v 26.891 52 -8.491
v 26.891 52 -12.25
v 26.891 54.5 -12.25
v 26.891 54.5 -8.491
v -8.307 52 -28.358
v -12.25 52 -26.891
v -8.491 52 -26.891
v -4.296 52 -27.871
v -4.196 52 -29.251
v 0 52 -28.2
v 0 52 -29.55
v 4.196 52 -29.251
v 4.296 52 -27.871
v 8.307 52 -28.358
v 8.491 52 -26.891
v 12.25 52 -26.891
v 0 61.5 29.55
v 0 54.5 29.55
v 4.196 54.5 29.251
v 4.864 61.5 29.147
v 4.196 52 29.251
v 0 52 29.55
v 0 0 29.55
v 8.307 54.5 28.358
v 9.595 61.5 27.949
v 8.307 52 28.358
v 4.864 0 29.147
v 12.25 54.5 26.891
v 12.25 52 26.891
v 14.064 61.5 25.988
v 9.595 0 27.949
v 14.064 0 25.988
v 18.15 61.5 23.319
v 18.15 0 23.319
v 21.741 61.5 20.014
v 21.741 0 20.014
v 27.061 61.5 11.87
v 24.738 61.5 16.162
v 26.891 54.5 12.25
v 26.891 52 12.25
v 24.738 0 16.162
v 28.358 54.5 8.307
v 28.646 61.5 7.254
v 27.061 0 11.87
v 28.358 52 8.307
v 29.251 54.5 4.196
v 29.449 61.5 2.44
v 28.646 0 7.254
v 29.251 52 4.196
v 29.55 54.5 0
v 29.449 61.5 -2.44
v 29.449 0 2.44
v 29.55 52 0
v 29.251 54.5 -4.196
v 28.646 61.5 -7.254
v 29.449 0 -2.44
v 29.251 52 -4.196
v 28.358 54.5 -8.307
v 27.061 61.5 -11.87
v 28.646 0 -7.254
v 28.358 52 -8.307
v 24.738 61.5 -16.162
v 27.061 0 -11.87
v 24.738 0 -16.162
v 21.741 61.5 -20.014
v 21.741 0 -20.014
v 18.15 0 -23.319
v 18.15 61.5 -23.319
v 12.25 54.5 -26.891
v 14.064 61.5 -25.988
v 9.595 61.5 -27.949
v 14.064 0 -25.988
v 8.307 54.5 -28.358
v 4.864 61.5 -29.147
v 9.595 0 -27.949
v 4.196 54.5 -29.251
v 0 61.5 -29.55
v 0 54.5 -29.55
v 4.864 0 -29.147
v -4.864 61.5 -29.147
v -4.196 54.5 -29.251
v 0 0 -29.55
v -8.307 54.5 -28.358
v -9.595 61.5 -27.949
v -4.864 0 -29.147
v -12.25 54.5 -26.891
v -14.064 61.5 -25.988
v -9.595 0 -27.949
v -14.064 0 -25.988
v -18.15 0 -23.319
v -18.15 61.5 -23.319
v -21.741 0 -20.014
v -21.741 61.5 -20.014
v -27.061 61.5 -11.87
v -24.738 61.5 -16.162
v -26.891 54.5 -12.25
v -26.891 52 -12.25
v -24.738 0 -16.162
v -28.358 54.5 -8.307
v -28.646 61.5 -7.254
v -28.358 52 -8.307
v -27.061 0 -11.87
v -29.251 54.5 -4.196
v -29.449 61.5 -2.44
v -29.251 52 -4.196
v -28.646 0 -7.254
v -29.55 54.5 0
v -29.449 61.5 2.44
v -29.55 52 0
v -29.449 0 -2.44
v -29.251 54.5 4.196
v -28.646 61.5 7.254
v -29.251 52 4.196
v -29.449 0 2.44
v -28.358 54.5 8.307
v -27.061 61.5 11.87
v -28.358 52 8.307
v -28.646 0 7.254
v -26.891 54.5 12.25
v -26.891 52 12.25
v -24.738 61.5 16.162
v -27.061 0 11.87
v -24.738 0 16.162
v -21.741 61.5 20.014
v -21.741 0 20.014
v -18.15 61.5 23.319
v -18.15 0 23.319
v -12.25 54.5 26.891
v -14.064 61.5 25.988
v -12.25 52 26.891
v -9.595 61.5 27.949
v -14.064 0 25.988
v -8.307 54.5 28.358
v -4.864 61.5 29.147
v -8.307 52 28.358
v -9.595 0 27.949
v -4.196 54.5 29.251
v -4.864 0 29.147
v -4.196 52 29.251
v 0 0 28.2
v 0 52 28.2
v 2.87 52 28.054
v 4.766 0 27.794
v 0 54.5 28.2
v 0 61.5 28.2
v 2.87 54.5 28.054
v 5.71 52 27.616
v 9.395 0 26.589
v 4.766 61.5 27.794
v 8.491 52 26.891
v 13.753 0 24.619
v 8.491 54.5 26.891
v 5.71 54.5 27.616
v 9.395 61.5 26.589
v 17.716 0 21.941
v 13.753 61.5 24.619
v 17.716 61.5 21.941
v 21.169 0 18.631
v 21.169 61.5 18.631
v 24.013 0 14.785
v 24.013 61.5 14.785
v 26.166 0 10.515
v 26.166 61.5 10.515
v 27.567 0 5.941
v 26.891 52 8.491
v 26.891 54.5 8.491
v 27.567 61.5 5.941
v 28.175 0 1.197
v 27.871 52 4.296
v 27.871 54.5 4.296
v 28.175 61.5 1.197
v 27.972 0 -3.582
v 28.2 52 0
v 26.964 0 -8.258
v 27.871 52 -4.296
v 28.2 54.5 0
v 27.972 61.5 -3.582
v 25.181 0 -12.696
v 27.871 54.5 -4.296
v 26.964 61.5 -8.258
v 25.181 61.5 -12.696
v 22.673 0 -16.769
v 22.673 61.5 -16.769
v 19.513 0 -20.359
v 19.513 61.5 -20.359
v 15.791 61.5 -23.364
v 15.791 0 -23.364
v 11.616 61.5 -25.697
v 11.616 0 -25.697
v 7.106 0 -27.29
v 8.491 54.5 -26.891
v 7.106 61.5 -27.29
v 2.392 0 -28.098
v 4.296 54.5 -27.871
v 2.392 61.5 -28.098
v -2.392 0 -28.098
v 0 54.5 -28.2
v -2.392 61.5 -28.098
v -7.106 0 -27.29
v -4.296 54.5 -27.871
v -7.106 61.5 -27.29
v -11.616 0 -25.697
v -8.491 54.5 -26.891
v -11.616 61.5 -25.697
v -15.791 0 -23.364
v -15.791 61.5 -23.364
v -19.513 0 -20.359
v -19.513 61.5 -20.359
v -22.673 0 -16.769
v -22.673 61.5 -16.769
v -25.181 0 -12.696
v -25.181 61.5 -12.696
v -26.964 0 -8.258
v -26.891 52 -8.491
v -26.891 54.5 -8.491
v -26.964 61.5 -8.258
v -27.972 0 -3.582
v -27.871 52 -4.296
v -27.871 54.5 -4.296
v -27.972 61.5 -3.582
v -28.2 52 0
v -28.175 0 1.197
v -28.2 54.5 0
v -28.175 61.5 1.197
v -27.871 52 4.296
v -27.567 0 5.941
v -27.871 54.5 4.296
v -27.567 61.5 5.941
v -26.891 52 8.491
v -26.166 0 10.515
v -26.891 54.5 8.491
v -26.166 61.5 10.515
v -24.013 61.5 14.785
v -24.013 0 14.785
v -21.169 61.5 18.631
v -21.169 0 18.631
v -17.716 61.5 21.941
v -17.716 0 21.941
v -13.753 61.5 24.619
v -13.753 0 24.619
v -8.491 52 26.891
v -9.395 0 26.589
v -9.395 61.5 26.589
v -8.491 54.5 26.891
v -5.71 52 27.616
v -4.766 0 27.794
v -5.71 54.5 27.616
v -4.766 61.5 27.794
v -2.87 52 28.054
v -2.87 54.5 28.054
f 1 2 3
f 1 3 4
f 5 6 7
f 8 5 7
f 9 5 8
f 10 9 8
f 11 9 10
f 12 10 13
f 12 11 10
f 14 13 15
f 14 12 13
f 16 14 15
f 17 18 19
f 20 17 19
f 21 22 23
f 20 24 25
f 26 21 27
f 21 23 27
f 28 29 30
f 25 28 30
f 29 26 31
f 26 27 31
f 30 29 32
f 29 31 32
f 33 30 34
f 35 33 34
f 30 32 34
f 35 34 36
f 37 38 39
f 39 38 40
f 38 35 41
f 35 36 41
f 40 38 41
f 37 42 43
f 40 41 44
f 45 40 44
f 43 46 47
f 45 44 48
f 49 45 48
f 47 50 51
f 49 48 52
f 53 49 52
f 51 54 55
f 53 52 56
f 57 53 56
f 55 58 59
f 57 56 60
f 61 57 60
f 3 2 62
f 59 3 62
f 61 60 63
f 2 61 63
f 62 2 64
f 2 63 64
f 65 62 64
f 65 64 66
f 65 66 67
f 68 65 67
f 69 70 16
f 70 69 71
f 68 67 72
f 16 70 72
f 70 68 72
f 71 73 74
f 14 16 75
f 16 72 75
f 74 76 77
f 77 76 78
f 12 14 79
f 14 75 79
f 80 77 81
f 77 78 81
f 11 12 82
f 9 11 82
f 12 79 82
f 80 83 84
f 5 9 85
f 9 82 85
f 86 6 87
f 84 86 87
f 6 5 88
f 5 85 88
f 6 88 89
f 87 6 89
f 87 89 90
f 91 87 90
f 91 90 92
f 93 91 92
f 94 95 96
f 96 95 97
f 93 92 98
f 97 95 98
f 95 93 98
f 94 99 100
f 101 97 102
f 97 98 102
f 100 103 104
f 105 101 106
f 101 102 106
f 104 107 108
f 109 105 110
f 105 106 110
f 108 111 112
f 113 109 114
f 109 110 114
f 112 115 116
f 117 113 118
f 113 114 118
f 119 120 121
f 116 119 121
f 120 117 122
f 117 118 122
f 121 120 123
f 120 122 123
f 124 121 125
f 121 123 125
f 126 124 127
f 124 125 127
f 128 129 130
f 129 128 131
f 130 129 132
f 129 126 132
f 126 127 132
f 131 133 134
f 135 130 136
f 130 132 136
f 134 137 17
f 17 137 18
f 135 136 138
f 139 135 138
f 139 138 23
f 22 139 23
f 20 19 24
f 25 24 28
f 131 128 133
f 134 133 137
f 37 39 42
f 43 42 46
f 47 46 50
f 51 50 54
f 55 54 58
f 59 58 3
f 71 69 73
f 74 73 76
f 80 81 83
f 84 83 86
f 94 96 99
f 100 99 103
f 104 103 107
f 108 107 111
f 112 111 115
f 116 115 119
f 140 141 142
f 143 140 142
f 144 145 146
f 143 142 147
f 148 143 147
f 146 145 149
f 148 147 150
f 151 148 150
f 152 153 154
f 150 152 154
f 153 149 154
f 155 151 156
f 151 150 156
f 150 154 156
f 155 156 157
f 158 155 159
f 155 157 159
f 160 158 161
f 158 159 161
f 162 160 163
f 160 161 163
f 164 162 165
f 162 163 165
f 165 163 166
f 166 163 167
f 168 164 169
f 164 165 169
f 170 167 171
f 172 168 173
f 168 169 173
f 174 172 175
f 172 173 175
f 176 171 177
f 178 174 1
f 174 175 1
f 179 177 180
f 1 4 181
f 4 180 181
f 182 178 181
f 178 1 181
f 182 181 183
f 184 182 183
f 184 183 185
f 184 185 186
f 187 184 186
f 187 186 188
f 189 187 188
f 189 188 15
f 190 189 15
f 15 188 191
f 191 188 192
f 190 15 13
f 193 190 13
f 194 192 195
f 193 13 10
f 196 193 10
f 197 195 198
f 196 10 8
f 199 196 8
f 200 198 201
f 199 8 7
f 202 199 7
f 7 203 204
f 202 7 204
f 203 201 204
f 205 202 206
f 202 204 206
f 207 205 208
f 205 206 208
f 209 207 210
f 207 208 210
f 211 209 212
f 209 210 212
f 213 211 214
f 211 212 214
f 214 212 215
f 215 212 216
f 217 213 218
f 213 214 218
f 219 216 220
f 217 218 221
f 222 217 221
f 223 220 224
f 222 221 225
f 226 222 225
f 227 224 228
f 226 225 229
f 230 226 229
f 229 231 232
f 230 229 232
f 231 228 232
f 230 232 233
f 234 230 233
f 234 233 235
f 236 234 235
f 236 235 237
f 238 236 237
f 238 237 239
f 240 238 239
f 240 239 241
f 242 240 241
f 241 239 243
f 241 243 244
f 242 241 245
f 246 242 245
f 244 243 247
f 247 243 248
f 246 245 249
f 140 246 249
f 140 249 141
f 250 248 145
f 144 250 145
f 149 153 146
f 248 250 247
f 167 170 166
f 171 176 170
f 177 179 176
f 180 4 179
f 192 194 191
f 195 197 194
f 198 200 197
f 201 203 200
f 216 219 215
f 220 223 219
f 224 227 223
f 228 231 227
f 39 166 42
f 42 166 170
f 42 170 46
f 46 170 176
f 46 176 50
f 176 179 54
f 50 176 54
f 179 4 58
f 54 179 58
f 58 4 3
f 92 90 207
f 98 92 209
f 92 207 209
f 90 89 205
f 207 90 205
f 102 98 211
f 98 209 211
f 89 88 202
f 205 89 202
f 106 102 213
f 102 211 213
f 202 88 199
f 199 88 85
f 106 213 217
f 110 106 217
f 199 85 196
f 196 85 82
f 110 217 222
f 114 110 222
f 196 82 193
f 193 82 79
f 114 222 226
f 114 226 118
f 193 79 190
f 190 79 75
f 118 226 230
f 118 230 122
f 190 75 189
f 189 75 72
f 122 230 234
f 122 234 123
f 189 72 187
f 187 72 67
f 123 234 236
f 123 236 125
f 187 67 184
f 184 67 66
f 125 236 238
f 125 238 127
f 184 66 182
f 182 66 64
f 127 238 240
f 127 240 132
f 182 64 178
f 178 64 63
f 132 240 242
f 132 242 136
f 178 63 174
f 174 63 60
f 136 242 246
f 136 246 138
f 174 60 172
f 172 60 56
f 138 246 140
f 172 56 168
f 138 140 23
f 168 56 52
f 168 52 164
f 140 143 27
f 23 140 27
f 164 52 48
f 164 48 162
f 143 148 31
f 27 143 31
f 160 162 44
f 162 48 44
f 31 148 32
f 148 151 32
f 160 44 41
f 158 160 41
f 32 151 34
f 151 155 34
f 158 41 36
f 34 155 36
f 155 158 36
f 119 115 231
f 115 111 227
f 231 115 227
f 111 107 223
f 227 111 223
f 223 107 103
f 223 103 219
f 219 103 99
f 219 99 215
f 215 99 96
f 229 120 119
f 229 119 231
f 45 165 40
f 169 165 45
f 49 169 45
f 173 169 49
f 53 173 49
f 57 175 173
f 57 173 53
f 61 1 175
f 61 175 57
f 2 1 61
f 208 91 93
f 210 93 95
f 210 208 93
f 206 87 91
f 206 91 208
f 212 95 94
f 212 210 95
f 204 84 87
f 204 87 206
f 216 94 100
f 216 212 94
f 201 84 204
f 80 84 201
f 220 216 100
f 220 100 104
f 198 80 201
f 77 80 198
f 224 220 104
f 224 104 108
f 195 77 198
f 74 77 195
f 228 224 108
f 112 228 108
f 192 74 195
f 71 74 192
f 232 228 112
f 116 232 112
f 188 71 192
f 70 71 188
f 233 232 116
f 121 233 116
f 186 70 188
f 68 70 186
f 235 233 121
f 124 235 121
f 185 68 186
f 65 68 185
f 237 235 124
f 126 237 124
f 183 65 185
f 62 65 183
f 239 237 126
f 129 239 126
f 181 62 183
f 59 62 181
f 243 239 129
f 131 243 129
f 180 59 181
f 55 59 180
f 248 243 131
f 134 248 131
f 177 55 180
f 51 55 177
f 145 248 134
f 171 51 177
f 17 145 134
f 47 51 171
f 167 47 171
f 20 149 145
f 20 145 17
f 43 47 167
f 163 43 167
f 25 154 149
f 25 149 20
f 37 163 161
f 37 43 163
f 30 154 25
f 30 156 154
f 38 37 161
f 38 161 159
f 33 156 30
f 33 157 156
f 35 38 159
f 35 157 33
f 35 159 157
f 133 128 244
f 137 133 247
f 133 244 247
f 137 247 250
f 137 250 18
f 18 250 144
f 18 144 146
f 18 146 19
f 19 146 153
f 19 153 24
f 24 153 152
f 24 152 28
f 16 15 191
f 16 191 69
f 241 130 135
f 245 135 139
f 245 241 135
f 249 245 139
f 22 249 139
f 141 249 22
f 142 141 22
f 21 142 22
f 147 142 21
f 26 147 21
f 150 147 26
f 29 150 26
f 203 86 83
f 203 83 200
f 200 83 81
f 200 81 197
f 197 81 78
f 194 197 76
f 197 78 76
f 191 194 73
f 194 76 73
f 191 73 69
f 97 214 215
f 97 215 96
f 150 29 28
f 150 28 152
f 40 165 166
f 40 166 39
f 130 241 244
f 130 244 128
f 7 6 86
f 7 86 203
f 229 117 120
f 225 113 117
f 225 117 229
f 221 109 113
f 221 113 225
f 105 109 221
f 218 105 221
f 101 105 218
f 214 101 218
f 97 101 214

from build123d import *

# Parameters (mm, degrees)
SKETCH1_R           = 29.55
BOSS_EXTRUDE1_DEPTH = 61.5
SKETCH2_R           = 28.2
CUT_EXTRUDE1_DEPTH  = 61.5
CUT_EXTRUDE2_START  = -2.5
CUT_EXTRUDE2_DEPTH  = 2.5


with BuildPart() as part:
    # Sketch1 → Boss-Extrude1 (new body)
    with BuildSketch(Plane(origin=(0, 0, 0), x_dir=(1, 0, 0), z_dir=(0, 1, 0))):
        with Locations(Location((0, 0, 0), (0, 0, 270))):
            Circle(SKETCH1_R)
    extrude(amount=BOSS_EXTRUDE1_DEPTH)

    # Sketch2 → Cut-Extrude1 (cut)
    with BuildSketch(Plane(origin=(0, 61.5, 0), x_dir=(1, 0, 0), z_dir=(0, 1, 0))):
        with Locations(Location((0, 0, 0), (0, 0, 270))):
            Circle(SKETCH2_R)
    extrude(amount=-CUT_EXTRUDE1_DEPTH, mode=Mode.SUBTRACT)

    # Sketch3 → Cut-Extrude2 (cut)
    with BuildSketch(Plane(origin=(0, 54.50000003, 0), x_dir=(1, 0, 0), z_dir=(0, 1, 0)).offset(CUT_EXTRUDE2_START)):
        with BuildLine():
            Line((-12.25, 26.891262521), (12.25, 26.891262521))
            ThreePointArc((12.25, 26.891262521), (0, 29.55), (-12.25, 26.891262521))
        make_face()
        with BuildLine():
            Line((26.891262521, 12.25), (26.891262521, -12.25))
            ThreePointArc((26.891262521, -12.25), (29.55, 0), (26.891262521, 12.25))
        make_face()
        with BuildLine():
            Line((12.25, -26.891262521), (-12.25, -26.891262521))
            ThreePointArc((-12.25, -26.891262521), (0, -29.55), (12.25, -26.891262521))
        make_face()
        with BuildLine():
            Line((-26.891262521, -12.25), (-26.891262521, 12.25))
            ThreePointArc((-26.891262521, 12.25), (-29.55, 0), (-26.891262521, -12.25))
        make_face()
    extrude(amount=CUT_EXTRUDE2_DEPTH, mode=Mode.SUBTRACT)


solid = part.part
